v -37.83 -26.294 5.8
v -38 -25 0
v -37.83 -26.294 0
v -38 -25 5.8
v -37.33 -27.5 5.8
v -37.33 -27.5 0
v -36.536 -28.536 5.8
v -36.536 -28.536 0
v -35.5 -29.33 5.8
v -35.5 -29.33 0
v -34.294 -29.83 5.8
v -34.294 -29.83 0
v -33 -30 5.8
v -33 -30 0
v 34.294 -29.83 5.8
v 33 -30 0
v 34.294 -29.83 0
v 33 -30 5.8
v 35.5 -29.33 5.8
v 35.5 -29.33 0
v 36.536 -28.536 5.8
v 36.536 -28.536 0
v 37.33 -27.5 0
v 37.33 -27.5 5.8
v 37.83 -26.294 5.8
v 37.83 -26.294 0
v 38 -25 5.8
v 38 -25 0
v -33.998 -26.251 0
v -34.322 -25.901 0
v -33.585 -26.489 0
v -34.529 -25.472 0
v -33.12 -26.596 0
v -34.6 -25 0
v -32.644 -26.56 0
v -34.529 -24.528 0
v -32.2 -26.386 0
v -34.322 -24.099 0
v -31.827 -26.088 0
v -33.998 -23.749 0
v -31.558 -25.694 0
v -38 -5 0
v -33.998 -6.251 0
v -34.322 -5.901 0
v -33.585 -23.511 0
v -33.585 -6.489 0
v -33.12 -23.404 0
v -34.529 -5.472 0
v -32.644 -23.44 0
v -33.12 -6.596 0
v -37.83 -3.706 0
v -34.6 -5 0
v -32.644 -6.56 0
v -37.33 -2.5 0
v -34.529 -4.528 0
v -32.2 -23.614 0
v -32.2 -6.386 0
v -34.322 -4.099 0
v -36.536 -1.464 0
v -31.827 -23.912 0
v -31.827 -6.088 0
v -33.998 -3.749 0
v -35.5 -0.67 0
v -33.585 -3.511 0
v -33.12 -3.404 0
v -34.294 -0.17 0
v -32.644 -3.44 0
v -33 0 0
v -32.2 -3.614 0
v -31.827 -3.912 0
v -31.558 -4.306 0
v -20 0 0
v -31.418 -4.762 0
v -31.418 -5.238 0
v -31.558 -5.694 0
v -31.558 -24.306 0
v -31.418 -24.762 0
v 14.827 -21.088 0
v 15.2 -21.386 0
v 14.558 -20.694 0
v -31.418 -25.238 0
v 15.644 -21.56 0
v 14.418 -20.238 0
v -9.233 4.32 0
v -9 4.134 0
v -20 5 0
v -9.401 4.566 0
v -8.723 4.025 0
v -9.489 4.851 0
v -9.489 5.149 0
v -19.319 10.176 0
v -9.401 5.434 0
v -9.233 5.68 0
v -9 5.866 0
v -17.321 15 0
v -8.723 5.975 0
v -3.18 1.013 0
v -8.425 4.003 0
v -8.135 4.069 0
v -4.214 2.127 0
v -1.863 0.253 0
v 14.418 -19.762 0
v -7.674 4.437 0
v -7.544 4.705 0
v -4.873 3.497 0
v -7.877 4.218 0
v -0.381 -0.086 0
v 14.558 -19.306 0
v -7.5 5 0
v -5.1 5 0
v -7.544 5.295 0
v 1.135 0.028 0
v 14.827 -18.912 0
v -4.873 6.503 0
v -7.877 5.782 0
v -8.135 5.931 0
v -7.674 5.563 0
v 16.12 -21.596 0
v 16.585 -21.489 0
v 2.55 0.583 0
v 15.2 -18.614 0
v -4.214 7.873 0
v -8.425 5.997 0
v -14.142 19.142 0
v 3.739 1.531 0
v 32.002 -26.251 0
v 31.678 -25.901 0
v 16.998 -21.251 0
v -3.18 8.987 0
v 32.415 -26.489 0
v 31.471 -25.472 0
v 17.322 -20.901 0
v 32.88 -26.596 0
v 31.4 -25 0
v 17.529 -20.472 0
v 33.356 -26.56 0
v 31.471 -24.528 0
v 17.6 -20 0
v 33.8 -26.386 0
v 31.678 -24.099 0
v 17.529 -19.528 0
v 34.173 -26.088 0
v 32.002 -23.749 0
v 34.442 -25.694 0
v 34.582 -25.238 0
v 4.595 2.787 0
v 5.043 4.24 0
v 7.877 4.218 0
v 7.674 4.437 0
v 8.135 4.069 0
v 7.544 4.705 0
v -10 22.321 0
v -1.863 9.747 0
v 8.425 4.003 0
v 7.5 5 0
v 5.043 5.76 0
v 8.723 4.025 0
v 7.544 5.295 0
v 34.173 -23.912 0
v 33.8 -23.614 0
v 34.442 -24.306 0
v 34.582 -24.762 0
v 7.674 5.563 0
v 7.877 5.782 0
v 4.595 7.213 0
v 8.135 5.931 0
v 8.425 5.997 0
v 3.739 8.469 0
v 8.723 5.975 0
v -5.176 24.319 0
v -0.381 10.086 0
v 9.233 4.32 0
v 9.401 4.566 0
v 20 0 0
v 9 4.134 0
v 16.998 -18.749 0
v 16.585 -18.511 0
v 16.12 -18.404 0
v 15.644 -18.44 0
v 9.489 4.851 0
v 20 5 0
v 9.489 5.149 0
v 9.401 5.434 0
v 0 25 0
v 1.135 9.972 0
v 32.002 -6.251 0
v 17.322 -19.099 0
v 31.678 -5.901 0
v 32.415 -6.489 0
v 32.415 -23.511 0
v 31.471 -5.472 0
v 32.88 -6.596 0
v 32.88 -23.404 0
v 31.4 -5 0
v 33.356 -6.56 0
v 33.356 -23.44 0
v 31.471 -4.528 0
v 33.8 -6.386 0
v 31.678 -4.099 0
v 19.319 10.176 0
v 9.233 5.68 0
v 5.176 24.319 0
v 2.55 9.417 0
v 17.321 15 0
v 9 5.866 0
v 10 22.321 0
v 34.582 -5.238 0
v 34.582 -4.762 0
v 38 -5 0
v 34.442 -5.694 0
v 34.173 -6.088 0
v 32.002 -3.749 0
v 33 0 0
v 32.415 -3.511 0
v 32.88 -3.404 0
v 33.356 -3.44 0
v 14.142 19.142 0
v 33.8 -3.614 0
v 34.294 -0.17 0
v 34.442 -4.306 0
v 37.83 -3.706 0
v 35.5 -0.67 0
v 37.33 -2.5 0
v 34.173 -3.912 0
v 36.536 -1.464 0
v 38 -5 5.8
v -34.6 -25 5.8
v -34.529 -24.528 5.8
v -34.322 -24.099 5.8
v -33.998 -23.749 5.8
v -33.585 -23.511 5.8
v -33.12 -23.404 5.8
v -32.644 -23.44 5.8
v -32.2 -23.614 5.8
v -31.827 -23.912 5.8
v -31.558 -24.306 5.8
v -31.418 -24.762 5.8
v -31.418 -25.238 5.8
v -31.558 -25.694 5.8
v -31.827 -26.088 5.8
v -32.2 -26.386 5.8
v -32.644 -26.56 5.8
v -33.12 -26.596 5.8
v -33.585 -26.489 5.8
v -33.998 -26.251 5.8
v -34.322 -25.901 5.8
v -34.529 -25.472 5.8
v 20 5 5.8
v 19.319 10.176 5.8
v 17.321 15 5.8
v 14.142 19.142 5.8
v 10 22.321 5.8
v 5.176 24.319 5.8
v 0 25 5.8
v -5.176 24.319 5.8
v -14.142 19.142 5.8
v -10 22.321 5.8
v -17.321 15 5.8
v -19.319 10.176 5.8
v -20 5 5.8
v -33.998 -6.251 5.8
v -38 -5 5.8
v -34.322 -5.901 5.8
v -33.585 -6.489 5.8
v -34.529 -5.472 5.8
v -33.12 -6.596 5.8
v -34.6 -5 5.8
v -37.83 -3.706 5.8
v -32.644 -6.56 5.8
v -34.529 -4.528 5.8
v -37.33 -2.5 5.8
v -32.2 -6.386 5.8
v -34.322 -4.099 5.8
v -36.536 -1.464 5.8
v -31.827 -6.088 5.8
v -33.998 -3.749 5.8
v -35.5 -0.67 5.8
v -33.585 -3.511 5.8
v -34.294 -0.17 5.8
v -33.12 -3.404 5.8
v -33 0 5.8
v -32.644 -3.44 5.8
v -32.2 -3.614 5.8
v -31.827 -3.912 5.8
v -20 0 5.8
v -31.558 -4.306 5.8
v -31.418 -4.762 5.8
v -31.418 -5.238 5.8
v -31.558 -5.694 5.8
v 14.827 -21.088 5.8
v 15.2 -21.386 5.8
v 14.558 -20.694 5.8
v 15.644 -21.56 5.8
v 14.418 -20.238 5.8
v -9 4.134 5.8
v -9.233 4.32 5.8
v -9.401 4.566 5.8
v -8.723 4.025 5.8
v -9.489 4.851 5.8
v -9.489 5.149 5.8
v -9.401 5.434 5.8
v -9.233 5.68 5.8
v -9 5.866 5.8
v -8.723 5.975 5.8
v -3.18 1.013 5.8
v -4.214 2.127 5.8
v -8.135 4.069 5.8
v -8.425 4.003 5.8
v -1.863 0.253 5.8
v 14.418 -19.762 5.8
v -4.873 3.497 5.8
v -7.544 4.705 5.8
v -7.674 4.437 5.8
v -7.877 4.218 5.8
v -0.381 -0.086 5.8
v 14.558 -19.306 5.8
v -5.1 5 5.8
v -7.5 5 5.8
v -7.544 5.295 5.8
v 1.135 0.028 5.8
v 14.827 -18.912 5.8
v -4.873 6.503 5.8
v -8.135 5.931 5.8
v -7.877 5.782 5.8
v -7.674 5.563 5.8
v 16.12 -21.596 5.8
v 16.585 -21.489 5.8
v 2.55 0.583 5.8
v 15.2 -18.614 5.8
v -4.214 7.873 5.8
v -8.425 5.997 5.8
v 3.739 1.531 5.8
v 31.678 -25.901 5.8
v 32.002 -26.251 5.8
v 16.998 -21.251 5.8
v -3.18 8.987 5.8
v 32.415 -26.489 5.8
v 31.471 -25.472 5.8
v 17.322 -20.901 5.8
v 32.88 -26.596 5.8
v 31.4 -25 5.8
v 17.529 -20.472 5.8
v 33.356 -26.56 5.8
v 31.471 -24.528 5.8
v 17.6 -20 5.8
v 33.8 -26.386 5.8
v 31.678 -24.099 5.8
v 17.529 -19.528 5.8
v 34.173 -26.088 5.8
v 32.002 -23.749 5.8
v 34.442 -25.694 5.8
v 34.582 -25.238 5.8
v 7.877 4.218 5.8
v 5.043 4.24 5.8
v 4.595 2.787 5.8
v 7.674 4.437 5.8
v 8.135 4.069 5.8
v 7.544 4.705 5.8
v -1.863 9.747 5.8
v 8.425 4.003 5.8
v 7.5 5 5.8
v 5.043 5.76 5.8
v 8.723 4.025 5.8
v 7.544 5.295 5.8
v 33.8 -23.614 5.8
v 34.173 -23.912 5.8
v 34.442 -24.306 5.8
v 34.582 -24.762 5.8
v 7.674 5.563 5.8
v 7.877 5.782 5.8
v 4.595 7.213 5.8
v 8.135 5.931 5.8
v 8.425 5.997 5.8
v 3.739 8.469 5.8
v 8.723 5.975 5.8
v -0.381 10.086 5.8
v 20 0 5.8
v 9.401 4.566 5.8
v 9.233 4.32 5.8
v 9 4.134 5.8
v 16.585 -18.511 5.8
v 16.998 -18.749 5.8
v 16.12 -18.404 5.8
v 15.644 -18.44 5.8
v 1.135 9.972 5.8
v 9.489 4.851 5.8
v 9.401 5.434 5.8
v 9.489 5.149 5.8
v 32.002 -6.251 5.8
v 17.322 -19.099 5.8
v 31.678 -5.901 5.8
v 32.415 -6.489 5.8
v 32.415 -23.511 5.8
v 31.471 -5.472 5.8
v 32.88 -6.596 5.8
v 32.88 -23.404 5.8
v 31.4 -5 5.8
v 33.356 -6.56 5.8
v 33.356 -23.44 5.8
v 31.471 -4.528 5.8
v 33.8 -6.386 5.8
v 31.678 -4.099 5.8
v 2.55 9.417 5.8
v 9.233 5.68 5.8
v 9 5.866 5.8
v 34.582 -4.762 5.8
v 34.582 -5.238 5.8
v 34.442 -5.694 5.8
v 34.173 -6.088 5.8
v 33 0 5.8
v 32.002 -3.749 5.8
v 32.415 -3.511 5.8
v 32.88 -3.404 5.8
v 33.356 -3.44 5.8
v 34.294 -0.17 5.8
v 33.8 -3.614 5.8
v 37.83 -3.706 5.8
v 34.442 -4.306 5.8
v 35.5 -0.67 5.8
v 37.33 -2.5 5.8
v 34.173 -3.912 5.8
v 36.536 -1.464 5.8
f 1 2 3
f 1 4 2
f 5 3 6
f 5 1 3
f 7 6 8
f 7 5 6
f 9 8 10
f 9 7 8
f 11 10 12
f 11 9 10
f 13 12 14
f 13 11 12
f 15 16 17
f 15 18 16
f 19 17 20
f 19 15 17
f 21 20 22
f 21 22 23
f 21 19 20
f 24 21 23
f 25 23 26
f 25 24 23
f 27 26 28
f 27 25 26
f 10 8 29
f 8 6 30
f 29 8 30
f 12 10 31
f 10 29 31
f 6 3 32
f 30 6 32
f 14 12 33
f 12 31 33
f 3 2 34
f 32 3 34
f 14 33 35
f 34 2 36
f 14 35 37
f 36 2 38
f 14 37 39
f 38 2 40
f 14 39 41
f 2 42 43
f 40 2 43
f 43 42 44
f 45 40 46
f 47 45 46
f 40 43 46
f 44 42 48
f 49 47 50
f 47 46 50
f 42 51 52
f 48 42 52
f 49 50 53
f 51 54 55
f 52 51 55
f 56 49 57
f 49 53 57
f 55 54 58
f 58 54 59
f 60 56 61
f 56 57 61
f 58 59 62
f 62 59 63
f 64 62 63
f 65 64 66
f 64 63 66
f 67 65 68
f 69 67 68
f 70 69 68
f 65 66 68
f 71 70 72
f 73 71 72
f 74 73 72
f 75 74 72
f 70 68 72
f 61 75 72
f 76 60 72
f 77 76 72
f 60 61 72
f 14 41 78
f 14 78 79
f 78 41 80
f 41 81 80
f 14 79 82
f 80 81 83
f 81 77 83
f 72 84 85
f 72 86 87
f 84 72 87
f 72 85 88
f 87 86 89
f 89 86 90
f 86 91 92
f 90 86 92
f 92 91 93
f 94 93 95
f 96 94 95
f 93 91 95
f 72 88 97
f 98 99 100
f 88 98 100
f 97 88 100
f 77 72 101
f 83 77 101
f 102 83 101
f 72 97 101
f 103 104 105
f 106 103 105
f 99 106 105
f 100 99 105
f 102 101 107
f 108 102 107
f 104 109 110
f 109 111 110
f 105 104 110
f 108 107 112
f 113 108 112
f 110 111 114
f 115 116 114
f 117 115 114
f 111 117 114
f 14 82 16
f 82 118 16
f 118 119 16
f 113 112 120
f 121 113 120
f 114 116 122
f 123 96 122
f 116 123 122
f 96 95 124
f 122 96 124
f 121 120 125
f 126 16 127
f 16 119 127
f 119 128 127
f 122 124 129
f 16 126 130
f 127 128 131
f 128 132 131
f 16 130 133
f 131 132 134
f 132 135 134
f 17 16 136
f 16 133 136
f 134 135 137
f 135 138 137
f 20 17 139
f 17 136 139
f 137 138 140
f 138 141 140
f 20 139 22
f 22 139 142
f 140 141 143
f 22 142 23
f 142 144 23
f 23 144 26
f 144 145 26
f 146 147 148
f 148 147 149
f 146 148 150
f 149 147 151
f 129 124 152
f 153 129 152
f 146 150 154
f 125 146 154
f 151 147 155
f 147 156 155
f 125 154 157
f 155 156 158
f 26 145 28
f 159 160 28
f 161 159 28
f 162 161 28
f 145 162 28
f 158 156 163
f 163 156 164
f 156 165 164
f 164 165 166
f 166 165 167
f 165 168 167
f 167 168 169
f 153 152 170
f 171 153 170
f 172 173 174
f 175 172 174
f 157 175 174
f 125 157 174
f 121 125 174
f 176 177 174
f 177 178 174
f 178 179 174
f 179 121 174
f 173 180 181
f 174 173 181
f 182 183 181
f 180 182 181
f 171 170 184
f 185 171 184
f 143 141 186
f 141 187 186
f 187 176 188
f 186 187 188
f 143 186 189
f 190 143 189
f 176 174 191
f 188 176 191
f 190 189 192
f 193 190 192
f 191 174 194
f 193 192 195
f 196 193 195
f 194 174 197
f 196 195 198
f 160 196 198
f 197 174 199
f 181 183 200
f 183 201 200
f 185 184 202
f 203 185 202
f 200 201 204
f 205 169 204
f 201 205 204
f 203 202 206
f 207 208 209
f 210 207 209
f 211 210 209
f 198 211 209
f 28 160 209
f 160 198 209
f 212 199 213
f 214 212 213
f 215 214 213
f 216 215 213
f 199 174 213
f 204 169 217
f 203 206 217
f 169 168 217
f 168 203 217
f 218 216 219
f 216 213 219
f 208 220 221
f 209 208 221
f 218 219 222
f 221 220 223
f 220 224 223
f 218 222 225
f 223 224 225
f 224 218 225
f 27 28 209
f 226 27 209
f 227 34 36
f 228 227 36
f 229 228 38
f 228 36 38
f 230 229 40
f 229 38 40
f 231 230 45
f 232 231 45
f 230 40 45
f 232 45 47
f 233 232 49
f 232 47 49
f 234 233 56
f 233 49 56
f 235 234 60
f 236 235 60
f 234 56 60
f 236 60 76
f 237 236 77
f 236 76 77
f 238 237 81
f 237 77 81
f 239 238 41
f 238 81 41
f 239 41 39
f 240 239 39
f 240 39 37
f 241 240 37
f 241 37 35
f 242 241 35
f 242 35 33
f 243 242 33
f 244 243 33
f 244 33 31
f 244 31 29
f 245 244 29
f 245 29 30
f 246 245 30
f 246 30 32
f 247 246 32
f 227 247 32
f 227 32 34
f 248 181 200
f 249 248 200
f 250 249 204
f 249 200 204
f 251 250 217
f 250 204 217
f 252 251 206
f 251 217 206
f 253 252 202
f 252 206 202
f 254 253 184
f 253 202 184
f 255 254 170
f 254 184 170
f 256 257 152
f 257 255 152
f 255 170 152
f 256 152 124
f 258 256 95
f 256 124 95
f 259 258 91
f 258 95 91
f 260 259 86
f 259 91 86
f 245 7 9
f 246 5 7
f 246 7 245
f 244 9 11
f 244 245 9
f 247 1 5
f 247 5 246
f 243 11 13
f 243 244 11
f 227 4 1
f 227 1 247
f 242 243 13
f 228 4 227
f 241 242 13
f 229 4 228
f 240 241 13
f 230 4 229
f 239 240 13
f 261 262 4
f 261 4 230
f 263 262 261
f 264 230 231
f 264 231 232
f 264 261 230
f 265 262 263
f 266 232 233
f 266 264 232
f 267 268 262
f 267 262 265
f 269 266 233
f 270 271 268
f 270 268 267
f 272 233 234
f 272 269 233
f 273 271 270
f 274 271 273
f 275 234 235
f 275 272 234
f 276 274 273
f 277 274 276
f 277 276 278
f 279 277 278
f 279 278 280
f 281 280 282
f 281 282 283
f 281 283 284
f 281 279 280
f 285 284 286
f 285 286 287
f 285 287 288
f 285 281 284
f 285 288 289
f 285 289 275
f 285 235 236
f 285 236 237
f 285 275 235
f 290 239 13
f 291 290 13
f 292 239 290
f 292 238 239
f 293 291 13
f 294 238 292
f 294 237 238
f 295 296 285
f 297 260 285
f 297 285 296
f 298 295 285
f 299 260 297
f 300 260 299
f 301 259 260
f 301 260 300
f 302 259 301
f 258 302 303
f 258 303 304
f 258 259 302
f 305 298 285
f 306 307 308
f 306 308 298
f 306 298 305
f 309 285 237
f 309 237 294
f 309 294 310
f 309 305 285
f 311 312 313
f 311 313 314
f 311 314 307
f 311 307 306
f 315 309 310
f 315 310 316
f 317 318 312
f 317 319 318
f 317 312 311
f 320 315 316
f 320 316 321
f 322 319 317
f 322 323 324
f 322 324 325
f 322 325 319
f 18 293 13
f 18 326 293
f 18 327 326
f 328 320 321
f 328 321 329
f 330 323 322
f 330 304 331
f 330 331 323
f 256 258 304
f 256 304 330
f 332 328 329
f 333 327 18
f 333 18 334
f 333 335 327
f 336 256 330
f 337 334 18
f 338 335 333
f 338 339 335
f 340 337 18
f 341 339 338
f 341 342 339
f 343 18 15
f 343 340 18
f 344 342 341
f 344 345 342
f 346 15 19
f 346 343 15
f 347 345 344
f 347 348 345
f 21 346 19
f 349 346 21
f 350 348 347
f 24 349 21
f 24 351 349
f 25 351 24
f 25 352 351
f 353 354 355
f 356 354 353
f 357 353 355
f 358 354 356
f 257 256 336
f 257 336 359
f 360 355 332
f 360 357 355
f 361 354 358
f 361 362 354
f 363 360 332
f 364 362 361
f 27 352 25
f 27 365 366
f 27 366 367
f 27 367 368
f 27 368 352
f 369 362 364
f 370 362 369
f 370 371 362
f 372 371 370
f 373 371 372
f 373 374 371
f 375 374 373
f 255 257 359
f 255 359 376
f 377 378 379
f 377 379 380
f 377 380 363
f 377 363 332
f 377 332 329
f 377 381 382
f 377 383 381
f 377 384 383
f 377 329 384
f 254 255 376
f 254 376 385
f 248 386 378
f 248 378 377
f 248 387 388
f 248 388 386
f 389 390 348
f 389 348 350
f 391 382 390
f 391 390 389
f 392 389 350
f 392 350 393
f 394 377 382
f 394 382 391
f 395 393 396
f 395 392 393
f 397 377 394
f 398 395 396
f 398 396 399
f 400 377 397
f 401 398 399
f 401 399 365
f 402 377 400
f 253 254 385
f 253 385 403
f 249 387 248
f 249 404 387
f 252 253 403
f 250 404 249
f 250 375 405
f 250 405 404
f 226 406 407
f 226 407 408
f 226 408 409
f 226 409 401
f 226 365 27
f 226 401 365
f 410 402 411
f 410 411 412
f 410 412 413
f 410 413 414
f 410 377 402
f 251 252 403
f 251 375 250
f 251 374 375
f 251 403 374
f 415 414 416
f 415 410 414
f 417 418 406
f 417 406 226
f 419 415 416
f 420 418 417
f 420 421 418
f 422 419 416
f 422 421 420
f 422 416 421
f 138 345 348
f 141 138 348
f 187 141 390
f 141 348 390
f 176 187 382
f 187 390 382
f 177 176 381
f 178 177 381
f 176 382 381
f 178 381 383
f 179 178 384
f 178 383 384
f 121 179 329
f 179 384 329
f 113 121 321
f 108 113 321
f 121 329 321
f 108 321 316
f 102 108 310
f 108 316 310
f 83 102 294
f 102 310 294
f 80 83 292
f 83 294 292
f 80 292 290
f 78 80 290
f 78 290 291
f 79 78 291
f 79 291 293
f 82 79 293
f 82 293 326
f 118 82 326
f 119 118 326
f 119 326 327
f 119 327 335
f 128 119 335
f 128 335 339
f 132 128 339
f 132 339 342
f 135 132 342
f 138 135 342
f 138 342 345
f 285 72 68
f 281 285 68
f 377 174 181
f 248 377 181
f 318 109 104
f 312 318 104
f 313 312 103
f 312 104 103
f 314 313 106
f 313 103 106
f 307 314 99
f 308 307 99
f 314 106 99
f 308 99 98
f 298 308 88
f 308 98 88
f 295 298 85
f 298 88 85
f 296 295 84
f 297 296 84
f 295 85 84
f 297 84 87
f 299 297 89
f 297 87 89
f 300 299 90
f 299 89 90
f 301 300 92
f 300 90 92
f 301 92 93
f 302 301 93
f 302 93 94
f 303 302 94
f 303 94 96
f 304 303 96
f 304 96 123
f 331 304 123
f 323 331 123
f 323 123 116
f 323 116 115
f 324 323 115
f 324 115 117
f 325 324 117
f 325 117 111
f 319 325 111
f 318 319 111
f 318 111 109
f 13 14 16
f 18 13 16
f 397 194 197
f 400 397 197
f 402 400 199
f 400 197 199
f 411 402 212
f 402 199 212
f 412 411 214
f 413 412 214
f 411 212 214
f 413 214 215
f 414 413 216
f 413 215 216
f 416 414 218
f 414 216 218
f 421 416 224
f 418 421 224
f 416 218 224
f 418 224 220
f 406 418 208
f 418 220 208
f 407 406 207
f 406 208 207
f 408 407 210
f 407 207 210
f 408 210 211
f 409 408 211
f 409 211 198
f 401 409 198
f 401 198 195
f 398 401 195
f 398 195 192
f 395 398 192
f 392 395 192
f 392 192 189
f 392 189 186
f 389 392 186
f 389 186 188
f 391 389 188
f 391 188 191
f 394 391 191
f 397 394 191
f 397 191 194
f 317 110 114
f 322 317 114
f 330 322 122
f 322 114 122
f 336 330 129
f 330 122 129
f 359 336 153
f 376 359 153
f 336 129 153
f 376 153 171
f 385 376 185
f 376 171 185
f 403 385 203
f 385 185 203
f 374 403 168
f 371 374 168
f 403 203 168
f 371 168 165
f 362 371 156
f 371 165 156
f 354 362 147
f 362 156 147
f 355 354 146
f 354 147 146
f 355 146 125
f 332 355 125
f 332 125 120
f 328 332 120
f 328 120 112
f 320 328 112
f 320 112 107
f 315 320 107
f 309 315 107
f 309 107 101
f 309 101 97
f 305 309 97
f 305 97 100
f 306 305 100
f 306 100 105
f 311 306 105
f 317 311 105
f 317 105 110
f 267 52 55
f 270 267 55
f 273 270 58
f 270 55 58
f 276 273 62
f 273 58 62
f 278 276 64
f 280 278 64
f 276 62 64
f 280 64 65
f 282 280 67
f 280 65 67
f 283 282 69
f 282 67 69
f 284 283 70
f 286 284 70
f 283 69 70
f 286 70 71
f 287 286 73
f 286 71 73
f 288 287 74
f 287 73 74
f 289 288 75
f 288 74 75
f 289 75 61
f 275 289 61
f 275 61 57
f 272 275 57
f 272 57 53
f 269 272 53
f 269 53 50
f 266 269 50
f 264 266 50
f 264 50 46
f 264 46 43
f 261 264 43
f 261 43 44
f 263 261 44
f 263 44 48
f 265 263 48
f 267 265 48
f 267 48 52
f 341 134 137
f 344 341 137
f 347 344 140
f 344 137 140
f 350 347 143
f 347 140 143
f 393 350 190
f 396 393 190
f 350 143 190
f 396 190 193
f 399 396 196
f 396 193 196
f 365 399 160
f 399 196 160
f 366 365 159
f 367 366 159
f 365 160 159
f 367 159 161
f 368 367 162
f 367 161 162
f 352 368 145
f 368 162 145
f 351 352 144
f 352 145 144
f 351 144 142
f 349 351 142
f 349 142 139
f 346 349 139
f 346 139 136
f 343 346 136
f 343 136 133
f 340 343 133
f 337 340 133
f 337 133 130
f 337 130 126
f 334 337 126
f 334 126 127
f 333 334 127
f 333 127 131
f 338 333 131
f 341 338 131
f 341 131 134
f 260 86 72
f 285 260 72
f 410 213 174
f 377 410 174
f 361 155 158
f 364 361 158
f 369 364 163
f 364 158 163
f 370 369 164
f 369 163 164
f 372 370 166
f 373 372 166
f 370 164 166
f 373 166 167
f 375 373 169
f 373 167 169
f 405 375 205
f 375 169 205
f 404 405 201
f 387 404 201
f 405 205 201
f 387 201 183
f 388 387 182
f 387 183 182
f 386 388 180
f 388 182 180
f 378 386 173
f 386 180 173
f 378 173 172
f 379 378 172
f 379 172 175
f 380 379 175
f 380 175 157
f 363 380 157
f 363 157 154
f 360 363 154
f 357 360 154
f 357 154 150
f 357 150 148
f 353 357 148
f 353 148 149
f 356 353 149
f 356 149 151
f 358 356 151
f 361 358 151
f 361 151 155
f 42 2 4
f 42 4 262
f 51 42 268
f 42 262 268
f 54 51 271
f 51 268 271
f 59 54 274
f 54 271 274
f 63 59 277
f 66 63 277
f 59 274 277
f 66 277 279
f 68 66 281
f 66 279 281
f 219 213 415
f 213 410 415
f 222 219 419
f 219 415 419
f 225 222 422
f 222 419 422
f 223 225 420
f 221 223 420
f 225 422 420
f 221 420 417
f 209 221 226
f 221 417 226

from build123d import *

# Parameters (mm, degrees)
SKETCH_1_W          = 76
SKETCH_1_H          = 60
EXTRUDE_3_DEPTH     = 5.8
SKETCH_4_R          = 5.1
SKETCH_4_R_2        = 1.6
CUT_EXTRUDE_2_DEPTH = 50
FILLET_4_R          = 5
CUT_EXTRUDE_7_DEPTH = 13.5
FILLET_8_R          = 5
SKETCH_11_R         = 1
CUT_EXTRUDE_8_DEPTH = 49.76105003
SKETCH_12_R         = 1.6
CUT_EXTRUDE_9_DEPTH = 49.76105003


with BuildPart() as part:
    # ｽｹｯﾁ1 → ﾎﾞｽ - 押し出し3 (new body)
    with BuildSketch(Plane.XY):
        Rectangle(SKETCH_1_W, SKETCH_1_H)
    extrude(amount=EXTRUDE_3_DEPTH)

    # ｽｹｯﾁ4 → ｶｯﾄ - 押し出し2 (cut)
    with BuildSketch(Plane(origin=(0, 0, 0), x_dir=(-1, 0, 0), z_dir=(0, 0, -1))):
        with Locations((0, 5)):
            Circle(SKETCH_4_R)
        with Locations((-33, -5)):
            Circle(SKETCH_4_R_2)
        with Locations((-33, -25)):
            Circle(SKETCH_4_R_2)
        with Locations((33, -25)):
            Circle(SKETCH_4_R_2)
        with Locations((33, -5)):
            Circle(SKETCH_4_R_2)
    extrude(amount=-CUT_EXTRUDE_2_DEPTH, mode=Mode.SUBTRACT)

    # ﾌｨﾚｯﾄ4
    fillet_4_edges = [part.edges().sort_by_distance(p)[0] for p in [
        (38, -30, 2.9),
        (-38, -30, 2.9),
        (-38, 30, 2.9),
        (38, 30, 2.9),
    ]]
    fillet(fillet_4_edges, radius=FILLET_4_R)

    # ｽｹｯﾁ10 → ｶｯﾄ - 押し出し7 (cut)
    with BuildSketch(Plane(origin=(0, 0, 0), x_dir=(-1, 0, 0), z_dir=(0, 0, -1))):
        with BuildLine():
            Line((-38, 0), (-20, 0))
            Line((-20, 0), (-20, 5))
            ThreePointArc((-20, 5), (0, 25), (20, 5))
            Line((20, 5), (20, 0))
            Line((20, 0), (38, 0))
            Line((38, 0), (38, 30))
            Line((38, 30), (-38, 30))
            Line((-38, 30), (-38, 0))
        make_face()
    extrude(amount=-CUT_EXTRUDE_7_DEPTH, mode=Mode.SUBTRACT)

    # ﾌｨﾚｯﾄ8
    fillet_8_edges = [part.edges().sort_by_distance(p)[0] for p in [
        (-38, 0, 2.9),
        (38, 0, 2.9),
    ]]
    fillet(fillet_8_edges, radius=FILLET_8_R)

    # ｽｹｯﾁ11 → ｶｯﾄ - 押し出し8 (cut, through all)
    with BuildSketch(Plane(origin=(0, 0, 0), x_dir=(-1, 0, 0), z_dir=(0, 0, -1))):
        with Locations((-8.5, 5)):
            Circle(SKETCH_11_R)
        with Locations(Location((8.5, 5, 0), (0, 0, 180))):
            Circle(SKETCH_11_R)
    extrude(amount=-CUT_EXTRUDE_8_DEPTH, mode=Mode.SUBTRACT)

    # ｽｹｯﾁ12 → ｶｯﾄ - 押し出し9 (cut, through all)
    with BuildSketch(Plane.XY.offset(5.8)):
        with Locations((16, -20)):
            Circle(SKETCH_12_R)
    extrude(amount=-CUT_EXTRUDE_9_DEPTH, mode=Mode.SUBTRACT)


solid = part.part
